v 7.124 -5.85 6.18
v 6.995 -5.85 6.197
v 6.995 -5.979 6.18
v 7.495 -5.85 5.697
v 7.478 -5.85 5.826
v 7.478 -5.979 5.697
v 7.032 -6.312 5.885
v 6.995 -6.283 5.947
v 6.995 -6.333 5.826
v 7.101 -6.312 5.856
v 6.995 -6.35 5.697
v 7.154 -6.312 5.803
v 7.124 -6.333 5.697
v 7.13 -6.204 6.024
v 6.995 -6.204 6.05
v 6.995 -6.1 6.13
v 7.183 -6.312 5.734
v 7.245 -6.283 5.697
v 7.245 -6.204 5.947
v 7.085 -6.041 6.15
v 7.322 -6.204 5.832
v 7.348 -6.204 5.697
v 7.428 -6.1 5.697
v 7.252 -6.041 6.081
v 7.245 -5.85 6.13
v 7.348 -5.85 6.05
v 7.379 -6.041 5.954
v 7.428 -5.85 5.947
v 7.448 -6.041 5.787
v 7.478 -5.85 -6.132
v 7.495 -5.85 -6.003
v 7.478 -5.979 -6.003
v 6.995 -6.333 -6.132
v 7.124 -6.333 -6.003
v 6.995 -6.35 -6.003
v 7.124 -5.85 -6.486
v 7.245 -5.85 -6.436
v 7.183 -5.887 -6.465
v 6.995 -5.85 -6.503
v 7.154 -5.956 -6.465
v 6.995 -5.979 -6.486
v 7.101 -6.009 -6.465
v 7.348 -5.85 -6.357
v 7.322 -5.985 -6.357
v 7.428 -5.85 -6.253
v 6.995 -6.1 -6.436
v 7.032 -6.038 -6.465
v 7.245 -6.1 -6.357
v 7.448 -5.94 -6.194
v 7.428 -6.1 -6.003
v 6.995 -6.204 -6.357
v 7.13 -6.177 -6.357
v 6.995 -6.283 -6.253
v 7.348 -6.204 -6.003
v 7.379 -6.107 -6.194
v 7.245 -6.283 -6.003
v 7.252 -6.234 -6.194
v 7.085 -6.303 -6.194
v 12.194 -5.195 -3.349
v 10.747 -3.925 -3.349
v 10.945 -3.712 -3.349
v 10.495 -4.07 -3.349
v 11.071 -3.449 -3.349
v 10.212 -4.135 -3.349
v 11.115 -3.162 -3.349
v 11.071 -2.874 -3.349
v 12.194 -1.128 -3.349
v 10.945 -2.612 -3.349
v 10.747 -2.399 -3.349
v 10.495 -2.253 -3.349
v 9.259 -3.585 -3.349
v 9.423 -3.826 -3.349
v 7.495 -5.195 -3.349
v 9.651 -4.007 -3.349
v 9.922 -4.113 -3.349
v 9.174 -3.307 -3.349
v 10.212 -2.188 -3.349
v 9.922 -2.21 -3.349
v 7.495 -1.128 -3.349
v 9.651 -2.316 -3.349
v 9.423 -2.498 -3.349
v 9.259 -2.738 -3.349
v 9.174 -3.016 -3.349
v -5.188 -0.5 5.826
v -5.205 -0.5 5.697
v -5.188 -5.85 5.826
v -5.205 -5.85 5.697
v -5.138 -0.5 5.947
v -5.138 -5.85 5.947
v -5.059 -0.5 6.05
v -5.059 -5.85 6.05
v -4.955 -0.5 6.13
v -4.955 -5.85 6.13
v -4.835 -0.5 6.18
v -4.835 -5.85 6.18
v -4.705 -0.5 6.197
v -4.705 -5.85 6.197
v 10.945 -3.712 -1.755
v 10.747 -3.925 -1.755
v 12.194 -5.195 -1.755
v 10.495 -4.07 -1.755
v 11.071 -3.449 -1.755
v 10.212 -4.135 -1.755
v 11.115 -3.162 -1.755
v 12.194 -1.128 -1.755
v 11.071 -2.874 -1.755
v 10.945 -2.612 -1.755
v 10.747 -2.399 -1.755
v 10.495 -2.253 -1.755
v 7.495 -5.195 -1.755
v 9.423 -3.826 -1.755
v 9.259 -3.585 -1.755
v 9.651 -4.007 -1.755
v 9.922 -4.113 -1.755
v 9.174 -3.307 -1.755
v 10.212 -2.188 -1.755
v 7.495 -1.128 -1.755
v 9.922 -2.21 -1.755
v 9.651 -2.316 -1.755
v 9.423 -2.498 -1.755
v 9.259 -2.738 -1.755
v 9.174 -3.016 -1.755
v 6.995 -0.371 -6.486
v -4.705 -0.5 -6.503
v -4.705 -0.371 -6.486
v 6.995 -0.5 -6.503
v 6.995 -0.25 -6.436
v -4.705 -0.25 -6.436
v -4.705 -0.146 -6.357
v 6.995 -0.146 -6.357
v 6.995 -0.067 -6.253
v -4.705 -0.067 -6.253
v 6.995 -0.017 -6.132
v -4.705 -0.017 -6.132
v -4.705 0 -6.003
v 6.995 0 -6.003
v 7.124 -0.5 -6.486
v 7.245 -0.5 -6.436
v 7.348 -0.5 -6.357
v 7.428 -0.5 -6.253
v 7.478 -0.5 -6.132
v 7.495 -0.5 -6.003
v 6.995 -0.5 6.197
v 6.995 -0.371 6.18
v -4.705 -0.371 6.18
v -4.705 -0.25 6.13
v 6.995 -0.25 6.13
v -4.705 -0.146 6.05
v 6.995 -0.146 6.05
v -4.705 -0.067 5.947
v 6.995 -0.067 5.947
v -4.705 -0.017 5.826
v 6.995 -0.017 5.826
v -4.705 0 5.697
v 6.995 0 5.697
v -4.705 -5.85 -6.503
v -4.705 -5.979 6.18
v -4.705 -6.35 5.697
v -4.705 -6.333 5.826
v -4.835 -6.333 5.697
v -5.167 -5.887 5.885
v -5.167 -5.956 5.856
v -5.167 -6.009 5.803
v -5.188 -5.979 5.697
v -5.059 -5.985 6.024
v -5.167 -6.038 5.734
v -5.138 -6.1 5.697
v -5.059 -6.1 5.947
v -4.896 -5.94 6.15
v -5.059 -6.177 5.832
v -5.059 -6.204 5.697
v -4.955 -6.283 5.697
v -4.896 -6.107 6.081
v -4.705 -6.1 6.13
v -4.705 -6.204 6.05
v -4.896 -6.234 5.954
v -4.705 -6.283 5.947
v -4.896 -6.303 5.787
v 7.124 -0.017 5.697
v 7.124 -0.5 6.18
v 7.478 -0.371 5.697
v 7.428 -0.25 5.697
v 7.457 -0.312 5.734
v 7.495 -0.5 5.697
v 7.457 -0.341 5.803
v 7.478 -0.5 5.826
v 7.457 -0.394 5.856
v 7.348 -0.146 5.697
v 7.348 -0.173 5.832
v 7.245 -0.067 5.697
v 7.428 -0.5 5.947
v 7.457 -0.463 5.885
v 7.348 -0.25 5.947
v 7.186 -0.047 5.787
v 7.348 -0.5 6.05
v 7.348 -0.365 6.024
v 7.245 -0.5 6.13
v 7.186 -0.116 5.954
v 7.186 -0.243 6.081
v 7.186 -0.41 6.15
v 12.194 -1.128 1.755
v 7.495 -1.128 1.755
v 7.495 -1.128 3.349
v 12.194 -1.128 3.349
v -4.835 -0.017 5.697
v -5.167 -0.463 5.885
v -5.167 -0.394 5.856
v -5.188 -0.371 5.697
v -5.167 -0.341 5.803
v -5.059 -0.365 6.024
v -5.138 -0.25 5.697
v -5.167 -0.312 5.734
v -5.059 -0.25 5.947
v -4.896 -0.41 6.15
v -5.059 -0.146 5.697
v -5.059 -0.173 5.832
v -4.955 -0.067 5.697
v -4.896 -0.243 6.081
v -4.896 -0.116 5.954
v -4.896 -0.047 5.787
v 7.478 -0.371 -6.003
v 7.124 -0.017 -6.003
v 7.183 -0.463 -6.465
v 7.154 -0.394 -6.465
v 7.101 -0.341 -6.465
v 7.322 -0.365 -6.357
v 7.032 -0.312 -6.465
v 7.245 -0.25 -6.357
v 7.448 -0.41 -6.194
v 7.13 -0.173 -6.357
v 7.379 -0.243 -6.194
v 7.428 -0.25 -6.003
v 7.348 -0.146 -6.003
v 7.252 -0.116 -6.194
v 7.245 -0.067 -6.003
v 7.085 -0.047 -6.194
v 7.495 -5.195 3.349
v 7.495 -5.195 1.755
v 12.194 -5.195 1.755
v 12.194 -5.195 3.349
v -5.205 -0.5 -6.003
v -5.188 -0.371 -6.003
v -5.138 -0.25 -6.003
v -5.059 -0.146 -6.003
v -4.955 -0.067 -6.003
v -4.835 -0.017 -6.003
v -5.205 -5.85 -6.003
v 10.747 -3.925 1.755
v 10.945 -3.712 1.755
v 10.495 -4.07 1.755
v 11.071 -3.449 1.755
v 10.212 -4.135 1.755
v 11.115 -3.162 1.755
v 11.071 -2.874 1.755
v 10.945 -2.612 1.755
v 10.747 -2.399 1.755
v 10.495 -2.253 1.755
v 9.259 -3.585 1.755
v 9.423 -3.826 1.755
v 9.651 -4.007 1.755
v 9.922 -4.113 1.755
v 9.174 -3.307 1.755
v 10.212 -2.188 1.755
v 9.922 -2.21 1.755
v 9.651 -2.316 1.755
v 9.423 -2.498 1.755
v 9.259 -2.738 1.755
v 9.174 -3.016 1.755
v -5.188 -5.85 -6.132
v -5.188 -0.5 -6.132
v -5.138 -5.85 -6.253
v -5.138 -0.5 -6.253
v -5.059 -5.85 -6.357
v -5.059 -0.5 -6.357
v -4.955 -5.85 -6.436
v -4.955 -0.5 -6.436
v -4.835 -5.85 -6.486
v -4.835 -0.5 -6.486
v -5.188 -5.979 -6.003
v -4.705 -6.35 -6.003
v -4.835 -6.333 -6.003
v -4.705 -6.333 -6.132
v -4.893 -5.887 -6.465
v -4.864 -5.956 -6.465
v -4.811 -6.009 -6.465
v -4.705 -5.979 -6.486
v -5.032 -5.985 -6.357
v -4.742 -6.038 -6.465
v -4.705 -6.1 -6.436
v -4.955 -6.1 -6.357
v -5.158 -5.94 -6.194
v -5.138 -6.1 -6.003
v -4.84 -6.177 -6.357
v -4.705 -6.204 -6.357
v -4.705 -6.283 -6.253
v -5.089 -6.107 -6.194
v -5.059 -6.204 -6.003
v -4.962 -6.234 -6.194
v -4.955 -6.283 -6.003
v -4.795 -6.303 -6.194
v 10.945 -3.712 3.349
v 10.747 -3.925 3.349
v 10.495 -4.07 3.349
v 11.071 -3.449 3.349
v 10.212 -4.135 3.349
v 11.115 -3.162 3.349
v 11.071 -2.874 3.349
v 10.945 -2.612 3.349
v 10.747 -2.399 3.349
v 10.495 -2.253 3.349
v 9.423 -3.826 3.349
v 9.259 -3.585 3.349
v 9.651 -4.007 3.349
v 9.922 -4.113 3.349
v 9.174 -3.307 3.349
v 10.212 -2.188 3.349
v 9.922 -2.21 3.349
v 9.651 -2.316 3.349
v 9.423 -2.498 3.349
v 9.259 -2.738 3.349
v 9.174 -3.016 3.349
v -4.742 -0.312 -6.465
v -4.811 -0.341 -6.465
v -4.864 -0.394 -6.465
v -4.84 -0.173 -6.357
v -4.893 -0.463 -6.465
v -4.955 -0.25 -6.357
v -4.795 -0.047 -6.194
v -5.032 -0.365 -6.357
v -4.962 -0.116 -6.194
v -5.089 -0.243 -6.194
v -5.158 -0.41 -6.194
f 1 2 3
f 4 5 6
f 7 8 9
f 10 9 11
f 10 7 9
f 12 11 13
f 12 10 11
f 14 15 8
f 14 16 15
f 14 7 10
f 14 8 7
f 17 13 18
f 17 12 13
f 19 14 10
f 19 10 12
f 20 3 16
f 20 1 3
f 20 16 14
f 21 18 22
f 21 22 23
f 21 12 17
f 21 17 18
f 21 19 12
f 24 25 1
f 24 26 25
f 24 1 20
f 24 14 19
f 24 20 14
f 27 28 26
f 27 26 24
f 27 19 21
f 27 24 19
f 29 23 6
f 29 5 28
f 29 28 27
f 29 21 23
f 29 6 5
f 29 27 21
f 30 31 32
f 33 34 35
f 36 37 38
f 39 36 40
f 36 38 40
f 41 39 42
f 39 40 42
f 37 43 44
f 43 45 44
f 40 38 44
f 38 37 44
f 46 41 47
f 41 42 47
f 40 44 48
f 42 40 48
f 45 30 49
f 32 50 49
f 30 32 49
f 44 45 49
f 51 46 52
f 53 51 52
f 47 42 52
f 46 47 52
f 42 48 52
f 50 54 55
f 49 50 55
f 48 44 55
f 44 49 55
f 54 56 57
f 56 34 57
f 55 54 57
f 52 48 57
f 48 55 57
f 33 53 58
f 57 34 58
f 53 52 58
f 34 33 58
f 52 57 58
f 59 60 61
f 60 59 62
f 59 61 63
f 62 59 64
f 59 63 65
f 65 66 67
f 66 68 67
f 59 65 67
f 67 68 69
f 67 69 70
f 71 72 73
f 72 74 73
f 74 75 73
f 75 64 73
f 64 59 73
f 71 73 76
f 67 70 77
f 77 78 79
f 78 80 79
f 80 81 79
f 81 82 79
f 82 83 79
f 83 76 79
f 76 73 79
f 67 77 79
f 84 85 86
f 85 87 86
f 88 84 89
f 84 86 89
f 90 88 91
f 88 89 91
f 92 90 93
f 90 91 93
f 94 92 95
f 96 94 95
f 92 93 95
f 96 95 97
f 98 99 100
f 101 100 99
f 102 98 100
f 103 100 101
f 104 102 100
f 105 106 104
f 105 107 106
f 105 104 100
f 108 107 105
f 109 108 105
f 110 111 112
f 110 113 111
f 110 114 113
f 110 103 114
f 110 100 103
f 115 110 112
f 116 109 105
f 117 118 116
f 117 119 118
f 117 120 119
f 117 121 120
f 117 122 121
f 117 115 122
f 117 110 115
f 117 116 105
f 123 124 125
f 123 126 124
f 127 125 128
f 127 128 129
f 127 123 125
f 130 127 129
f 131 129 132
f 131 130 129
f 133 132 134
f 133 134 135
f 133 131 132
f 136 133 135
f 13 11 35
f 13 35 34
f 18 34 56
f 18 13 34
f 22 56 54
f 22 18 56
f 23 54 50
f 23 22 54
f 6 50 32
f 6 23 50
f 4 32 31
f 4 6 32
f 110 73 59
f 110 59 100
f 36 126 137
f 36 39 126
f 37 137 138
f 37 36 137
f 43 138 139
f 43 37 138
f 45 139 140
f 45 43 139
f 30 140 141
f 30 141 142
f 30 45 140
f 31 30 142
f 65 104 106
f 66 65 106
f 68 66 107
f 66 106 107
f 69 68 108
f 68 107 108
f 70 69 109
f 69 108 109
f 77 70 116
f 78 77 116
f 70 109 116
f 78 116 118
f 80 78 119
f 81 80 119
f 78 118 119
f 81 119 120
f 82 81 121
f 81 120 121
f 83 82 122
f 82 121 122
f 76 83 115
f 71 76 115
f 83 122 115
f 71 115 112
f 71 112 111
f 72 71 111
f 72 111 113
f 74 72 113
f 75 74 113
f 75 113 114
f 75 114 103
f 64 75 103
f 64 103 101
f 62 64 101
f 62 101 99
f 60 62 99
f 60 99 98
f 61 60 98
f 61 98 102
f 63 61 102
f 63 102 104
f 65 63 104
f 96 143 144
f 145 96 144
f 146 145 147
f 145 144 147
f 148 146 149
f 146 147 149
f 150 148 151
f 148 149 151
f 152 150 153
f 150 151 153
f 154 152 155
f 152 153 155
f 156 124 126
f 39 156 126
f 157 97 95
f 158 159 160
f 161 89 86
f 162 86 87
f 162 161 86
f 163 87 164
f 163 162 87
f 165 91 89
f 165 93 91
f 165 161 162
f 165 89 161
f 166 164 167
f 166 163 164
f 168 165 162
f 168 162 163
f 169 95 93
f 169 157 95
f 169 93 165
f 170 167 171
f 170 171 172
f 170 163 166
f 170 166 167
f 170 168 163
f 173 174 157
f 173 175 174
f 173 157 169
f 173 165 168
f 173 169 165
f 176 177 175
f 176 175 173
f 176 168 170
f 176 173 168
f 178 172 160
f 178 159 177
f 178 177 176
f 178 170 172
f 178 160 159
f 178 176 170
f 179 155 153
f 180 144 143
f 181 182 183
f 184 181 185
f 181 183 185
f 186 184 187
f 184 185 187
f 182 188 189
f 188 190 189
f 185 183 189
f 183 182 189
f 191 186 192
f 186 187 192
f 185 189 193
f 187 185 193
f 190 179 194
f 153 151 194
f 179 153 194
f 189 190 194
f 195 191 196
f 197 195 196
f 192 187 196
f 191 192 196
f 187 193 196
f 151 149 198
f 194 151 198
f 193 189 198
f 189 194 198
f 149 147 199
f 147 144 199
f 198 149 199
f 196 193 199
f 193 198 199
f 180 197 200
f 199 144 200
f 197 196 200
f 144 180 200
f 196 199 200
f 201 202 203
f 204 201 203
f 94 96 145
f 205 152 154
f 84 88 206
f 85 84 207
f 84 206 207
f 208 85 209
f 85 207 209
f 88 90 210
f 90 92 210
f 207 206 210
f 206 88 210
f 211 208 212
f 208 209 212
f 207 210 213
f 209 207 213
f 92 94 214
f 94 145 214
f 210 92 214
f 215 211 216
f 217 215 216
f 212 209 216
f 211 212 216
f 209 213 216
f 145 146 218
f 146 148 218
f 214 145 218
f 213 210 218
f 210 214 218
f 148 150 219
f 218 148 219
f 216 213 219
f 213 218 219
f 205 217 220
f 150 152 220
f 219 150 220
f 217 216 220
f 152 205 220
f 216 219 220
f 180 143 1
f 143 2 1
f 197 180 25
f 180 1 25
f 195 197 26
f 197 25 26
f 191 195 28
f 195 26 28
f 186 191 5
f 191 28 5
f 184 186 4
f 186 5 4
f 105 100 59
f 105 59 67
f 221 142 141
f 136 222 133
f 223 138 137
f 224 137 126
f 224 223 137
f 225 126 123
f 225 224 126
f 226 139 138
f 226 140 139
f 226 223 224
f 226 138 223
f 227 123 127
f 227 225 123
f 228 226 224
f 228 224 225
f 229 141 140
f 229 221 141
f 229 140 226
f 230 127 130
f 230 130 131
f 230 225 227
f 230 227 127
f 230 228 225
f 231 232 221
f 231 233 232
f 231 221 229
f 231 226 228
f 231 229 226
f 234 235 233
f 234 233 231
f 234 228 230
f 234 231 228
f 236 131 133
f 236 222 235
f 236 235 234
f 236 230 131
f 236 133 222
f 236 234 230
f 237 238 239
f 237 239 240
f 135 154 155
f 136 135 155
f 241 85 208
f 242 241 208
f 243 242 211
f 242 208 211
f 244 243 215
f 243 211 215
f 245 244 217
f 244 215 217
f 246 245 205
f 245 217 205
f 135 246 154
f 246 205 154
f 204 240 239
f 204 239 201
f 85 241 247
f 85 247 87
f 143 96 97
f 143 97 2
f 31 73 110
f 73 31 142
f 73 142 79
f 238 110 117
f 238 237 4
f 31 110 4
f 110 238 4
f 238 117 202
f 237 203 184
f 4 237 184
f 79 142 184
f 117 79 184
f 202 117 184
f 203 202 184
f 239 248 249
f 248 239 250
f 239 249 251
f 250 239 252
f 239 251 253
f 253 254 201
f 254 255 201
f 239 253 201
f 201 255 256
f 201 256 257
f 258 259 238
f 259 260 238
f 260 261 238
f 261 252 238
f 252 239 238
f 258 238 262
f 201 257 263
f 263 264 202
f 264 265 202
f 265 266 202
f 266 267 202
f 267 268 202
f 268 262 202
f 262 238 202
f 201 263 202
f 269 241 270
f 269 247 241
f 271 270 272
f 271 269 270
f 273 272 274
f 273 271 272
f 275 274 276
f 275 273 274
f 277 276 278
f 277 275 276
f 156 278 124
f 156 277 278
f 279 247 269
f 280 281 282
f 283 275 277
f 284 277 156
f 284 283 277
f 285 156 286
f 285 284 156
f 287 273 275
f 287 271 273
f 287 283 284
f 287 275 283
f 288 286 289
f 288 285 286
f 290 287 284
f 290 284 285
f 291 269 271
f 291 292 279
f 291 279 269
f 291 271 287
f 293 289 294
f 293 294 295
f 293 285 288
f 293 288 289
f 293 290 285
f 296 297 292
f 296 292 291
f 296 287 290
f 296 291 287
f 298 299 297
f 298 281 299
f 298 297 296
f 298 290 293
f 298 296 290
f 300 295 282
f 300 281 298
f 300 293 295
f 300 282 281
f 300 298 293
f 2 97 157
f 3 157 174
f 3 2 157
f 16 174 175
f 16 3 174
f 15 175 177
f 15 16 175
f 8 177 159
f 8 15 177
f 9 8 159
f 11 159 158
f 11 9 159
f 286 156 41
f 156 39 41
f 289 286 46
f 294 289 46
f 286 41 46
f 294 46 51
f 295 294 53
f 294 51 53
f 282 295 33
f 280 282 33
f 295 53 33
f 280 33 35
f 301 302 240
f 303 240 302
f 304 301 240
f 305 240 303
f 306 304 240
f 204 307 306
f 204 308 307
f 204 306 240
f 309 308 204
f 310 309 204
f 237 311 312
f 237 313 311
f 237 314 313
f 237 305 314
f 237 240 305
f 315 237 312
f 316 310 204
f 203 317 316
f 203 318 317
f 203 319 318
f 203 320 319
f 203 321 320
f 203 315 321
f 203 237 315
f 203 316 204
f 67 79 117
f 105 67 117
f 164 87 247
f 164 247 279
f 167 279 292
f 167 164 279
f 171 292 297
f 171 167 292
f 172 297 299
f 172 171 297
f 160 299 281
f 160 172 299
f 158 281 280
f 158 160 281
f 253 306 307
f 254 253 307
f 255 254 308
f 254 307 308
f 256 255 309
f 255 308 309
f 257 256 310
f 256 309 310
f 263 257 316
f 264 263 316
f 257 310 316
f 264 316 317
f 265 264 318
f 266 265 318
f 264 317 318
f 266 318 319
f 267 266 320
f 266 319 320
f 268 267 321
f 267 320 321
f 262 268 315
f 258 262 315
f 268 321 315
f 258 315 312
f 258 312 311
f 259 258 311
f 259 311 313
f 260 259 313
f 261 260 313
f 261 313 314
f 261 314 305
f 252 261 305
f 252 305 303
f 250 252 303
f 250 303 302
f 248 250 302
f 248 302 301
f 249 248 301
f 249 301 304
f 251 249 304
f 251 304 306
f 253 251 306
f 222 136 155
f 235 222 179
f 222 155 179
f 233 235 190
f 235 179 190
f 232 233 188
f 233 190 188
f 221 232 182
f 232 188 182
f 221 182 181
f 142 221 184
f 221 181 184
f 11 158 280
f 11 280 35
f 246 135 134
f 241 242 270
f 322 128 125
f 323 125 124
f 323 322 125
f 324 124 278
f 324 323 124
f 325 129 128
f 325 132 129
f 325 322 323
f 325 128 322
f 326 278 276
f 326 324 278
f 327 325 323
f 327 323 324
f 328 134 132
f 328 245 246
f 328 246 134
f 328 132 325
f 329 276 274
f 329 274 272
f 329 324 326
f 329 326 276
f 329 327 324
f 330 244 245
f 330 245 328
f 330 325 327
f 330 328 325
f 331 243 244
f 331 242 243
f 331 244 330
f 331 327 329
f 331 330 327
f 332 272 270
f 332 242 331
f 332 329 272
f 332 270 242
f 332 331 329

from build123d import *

# Parameters (mm, degrees)
F0_W     = 12.7
F0_H     = 12.7
F1_DEPTH = 6.35
F2_W     = 4.066467
F2_H     = 1.594322
F4_DEPTH = 4.699
F5_R     = 0.976004
F6_DEPTH = 25.4
F7_R     = 0.5


with BuildPart() as f1:
    # F0 (on Front) → F1 (new body)
    with BuildSketch(Plane.XZ):
        with Locations((1.14489, -0.153085)):
            Rectangle(F0_W, F0_H)
    extrude(amount=F1_DEPTH)

    # F2 (on face) → F4 (join)
    with BuildSketch(Plane.YZ.offset(7.49489)):
        with Locations((-3.161712, 2.55219)):
            Rectangle(F2_W, F2_H)
        with Locations((-3.161712, -2.55219)):
            Rectangle(F2_W, F2_H)
    extrude(amount=F4_DEPTH)

    # F5 (on face) → F6 (cut)
    with BuildSketch(Plane.XY.offset(3.349351)):
        with Locations((10.138705, -3.161712)):
            Circle(F5_R)
    extrude(amount=-F6_DEPTH, mode=Mode.SUBTRACT)

    # F7
    f7_edges = [f1.edges().sort_by_distance(p)[0] for p in [
        (1.14489, 0, 6.196915),
        (7.49489, 0, -0.153085),
        (7.49489, -3.175, 6.196915),
        (1.14489, -6.35, 6.196915),
        (-5.20511, -3.175, 6.196915),
        (7.49489, -6.35, -0.153085),
        (7.49489, -3.175, -6.503085),
        (-5.20511, 0, -0.153085),
        (1.14489, 0, -6.503085),
        (-5.20511, -6.35, -0.153085),
        (-5.20511, -3.175, -6.503085),
        (1.14489, -6.35, -6.503085),
    ]]
    fillet(f7_edges, radius=F7_R)


solid = f1.part
